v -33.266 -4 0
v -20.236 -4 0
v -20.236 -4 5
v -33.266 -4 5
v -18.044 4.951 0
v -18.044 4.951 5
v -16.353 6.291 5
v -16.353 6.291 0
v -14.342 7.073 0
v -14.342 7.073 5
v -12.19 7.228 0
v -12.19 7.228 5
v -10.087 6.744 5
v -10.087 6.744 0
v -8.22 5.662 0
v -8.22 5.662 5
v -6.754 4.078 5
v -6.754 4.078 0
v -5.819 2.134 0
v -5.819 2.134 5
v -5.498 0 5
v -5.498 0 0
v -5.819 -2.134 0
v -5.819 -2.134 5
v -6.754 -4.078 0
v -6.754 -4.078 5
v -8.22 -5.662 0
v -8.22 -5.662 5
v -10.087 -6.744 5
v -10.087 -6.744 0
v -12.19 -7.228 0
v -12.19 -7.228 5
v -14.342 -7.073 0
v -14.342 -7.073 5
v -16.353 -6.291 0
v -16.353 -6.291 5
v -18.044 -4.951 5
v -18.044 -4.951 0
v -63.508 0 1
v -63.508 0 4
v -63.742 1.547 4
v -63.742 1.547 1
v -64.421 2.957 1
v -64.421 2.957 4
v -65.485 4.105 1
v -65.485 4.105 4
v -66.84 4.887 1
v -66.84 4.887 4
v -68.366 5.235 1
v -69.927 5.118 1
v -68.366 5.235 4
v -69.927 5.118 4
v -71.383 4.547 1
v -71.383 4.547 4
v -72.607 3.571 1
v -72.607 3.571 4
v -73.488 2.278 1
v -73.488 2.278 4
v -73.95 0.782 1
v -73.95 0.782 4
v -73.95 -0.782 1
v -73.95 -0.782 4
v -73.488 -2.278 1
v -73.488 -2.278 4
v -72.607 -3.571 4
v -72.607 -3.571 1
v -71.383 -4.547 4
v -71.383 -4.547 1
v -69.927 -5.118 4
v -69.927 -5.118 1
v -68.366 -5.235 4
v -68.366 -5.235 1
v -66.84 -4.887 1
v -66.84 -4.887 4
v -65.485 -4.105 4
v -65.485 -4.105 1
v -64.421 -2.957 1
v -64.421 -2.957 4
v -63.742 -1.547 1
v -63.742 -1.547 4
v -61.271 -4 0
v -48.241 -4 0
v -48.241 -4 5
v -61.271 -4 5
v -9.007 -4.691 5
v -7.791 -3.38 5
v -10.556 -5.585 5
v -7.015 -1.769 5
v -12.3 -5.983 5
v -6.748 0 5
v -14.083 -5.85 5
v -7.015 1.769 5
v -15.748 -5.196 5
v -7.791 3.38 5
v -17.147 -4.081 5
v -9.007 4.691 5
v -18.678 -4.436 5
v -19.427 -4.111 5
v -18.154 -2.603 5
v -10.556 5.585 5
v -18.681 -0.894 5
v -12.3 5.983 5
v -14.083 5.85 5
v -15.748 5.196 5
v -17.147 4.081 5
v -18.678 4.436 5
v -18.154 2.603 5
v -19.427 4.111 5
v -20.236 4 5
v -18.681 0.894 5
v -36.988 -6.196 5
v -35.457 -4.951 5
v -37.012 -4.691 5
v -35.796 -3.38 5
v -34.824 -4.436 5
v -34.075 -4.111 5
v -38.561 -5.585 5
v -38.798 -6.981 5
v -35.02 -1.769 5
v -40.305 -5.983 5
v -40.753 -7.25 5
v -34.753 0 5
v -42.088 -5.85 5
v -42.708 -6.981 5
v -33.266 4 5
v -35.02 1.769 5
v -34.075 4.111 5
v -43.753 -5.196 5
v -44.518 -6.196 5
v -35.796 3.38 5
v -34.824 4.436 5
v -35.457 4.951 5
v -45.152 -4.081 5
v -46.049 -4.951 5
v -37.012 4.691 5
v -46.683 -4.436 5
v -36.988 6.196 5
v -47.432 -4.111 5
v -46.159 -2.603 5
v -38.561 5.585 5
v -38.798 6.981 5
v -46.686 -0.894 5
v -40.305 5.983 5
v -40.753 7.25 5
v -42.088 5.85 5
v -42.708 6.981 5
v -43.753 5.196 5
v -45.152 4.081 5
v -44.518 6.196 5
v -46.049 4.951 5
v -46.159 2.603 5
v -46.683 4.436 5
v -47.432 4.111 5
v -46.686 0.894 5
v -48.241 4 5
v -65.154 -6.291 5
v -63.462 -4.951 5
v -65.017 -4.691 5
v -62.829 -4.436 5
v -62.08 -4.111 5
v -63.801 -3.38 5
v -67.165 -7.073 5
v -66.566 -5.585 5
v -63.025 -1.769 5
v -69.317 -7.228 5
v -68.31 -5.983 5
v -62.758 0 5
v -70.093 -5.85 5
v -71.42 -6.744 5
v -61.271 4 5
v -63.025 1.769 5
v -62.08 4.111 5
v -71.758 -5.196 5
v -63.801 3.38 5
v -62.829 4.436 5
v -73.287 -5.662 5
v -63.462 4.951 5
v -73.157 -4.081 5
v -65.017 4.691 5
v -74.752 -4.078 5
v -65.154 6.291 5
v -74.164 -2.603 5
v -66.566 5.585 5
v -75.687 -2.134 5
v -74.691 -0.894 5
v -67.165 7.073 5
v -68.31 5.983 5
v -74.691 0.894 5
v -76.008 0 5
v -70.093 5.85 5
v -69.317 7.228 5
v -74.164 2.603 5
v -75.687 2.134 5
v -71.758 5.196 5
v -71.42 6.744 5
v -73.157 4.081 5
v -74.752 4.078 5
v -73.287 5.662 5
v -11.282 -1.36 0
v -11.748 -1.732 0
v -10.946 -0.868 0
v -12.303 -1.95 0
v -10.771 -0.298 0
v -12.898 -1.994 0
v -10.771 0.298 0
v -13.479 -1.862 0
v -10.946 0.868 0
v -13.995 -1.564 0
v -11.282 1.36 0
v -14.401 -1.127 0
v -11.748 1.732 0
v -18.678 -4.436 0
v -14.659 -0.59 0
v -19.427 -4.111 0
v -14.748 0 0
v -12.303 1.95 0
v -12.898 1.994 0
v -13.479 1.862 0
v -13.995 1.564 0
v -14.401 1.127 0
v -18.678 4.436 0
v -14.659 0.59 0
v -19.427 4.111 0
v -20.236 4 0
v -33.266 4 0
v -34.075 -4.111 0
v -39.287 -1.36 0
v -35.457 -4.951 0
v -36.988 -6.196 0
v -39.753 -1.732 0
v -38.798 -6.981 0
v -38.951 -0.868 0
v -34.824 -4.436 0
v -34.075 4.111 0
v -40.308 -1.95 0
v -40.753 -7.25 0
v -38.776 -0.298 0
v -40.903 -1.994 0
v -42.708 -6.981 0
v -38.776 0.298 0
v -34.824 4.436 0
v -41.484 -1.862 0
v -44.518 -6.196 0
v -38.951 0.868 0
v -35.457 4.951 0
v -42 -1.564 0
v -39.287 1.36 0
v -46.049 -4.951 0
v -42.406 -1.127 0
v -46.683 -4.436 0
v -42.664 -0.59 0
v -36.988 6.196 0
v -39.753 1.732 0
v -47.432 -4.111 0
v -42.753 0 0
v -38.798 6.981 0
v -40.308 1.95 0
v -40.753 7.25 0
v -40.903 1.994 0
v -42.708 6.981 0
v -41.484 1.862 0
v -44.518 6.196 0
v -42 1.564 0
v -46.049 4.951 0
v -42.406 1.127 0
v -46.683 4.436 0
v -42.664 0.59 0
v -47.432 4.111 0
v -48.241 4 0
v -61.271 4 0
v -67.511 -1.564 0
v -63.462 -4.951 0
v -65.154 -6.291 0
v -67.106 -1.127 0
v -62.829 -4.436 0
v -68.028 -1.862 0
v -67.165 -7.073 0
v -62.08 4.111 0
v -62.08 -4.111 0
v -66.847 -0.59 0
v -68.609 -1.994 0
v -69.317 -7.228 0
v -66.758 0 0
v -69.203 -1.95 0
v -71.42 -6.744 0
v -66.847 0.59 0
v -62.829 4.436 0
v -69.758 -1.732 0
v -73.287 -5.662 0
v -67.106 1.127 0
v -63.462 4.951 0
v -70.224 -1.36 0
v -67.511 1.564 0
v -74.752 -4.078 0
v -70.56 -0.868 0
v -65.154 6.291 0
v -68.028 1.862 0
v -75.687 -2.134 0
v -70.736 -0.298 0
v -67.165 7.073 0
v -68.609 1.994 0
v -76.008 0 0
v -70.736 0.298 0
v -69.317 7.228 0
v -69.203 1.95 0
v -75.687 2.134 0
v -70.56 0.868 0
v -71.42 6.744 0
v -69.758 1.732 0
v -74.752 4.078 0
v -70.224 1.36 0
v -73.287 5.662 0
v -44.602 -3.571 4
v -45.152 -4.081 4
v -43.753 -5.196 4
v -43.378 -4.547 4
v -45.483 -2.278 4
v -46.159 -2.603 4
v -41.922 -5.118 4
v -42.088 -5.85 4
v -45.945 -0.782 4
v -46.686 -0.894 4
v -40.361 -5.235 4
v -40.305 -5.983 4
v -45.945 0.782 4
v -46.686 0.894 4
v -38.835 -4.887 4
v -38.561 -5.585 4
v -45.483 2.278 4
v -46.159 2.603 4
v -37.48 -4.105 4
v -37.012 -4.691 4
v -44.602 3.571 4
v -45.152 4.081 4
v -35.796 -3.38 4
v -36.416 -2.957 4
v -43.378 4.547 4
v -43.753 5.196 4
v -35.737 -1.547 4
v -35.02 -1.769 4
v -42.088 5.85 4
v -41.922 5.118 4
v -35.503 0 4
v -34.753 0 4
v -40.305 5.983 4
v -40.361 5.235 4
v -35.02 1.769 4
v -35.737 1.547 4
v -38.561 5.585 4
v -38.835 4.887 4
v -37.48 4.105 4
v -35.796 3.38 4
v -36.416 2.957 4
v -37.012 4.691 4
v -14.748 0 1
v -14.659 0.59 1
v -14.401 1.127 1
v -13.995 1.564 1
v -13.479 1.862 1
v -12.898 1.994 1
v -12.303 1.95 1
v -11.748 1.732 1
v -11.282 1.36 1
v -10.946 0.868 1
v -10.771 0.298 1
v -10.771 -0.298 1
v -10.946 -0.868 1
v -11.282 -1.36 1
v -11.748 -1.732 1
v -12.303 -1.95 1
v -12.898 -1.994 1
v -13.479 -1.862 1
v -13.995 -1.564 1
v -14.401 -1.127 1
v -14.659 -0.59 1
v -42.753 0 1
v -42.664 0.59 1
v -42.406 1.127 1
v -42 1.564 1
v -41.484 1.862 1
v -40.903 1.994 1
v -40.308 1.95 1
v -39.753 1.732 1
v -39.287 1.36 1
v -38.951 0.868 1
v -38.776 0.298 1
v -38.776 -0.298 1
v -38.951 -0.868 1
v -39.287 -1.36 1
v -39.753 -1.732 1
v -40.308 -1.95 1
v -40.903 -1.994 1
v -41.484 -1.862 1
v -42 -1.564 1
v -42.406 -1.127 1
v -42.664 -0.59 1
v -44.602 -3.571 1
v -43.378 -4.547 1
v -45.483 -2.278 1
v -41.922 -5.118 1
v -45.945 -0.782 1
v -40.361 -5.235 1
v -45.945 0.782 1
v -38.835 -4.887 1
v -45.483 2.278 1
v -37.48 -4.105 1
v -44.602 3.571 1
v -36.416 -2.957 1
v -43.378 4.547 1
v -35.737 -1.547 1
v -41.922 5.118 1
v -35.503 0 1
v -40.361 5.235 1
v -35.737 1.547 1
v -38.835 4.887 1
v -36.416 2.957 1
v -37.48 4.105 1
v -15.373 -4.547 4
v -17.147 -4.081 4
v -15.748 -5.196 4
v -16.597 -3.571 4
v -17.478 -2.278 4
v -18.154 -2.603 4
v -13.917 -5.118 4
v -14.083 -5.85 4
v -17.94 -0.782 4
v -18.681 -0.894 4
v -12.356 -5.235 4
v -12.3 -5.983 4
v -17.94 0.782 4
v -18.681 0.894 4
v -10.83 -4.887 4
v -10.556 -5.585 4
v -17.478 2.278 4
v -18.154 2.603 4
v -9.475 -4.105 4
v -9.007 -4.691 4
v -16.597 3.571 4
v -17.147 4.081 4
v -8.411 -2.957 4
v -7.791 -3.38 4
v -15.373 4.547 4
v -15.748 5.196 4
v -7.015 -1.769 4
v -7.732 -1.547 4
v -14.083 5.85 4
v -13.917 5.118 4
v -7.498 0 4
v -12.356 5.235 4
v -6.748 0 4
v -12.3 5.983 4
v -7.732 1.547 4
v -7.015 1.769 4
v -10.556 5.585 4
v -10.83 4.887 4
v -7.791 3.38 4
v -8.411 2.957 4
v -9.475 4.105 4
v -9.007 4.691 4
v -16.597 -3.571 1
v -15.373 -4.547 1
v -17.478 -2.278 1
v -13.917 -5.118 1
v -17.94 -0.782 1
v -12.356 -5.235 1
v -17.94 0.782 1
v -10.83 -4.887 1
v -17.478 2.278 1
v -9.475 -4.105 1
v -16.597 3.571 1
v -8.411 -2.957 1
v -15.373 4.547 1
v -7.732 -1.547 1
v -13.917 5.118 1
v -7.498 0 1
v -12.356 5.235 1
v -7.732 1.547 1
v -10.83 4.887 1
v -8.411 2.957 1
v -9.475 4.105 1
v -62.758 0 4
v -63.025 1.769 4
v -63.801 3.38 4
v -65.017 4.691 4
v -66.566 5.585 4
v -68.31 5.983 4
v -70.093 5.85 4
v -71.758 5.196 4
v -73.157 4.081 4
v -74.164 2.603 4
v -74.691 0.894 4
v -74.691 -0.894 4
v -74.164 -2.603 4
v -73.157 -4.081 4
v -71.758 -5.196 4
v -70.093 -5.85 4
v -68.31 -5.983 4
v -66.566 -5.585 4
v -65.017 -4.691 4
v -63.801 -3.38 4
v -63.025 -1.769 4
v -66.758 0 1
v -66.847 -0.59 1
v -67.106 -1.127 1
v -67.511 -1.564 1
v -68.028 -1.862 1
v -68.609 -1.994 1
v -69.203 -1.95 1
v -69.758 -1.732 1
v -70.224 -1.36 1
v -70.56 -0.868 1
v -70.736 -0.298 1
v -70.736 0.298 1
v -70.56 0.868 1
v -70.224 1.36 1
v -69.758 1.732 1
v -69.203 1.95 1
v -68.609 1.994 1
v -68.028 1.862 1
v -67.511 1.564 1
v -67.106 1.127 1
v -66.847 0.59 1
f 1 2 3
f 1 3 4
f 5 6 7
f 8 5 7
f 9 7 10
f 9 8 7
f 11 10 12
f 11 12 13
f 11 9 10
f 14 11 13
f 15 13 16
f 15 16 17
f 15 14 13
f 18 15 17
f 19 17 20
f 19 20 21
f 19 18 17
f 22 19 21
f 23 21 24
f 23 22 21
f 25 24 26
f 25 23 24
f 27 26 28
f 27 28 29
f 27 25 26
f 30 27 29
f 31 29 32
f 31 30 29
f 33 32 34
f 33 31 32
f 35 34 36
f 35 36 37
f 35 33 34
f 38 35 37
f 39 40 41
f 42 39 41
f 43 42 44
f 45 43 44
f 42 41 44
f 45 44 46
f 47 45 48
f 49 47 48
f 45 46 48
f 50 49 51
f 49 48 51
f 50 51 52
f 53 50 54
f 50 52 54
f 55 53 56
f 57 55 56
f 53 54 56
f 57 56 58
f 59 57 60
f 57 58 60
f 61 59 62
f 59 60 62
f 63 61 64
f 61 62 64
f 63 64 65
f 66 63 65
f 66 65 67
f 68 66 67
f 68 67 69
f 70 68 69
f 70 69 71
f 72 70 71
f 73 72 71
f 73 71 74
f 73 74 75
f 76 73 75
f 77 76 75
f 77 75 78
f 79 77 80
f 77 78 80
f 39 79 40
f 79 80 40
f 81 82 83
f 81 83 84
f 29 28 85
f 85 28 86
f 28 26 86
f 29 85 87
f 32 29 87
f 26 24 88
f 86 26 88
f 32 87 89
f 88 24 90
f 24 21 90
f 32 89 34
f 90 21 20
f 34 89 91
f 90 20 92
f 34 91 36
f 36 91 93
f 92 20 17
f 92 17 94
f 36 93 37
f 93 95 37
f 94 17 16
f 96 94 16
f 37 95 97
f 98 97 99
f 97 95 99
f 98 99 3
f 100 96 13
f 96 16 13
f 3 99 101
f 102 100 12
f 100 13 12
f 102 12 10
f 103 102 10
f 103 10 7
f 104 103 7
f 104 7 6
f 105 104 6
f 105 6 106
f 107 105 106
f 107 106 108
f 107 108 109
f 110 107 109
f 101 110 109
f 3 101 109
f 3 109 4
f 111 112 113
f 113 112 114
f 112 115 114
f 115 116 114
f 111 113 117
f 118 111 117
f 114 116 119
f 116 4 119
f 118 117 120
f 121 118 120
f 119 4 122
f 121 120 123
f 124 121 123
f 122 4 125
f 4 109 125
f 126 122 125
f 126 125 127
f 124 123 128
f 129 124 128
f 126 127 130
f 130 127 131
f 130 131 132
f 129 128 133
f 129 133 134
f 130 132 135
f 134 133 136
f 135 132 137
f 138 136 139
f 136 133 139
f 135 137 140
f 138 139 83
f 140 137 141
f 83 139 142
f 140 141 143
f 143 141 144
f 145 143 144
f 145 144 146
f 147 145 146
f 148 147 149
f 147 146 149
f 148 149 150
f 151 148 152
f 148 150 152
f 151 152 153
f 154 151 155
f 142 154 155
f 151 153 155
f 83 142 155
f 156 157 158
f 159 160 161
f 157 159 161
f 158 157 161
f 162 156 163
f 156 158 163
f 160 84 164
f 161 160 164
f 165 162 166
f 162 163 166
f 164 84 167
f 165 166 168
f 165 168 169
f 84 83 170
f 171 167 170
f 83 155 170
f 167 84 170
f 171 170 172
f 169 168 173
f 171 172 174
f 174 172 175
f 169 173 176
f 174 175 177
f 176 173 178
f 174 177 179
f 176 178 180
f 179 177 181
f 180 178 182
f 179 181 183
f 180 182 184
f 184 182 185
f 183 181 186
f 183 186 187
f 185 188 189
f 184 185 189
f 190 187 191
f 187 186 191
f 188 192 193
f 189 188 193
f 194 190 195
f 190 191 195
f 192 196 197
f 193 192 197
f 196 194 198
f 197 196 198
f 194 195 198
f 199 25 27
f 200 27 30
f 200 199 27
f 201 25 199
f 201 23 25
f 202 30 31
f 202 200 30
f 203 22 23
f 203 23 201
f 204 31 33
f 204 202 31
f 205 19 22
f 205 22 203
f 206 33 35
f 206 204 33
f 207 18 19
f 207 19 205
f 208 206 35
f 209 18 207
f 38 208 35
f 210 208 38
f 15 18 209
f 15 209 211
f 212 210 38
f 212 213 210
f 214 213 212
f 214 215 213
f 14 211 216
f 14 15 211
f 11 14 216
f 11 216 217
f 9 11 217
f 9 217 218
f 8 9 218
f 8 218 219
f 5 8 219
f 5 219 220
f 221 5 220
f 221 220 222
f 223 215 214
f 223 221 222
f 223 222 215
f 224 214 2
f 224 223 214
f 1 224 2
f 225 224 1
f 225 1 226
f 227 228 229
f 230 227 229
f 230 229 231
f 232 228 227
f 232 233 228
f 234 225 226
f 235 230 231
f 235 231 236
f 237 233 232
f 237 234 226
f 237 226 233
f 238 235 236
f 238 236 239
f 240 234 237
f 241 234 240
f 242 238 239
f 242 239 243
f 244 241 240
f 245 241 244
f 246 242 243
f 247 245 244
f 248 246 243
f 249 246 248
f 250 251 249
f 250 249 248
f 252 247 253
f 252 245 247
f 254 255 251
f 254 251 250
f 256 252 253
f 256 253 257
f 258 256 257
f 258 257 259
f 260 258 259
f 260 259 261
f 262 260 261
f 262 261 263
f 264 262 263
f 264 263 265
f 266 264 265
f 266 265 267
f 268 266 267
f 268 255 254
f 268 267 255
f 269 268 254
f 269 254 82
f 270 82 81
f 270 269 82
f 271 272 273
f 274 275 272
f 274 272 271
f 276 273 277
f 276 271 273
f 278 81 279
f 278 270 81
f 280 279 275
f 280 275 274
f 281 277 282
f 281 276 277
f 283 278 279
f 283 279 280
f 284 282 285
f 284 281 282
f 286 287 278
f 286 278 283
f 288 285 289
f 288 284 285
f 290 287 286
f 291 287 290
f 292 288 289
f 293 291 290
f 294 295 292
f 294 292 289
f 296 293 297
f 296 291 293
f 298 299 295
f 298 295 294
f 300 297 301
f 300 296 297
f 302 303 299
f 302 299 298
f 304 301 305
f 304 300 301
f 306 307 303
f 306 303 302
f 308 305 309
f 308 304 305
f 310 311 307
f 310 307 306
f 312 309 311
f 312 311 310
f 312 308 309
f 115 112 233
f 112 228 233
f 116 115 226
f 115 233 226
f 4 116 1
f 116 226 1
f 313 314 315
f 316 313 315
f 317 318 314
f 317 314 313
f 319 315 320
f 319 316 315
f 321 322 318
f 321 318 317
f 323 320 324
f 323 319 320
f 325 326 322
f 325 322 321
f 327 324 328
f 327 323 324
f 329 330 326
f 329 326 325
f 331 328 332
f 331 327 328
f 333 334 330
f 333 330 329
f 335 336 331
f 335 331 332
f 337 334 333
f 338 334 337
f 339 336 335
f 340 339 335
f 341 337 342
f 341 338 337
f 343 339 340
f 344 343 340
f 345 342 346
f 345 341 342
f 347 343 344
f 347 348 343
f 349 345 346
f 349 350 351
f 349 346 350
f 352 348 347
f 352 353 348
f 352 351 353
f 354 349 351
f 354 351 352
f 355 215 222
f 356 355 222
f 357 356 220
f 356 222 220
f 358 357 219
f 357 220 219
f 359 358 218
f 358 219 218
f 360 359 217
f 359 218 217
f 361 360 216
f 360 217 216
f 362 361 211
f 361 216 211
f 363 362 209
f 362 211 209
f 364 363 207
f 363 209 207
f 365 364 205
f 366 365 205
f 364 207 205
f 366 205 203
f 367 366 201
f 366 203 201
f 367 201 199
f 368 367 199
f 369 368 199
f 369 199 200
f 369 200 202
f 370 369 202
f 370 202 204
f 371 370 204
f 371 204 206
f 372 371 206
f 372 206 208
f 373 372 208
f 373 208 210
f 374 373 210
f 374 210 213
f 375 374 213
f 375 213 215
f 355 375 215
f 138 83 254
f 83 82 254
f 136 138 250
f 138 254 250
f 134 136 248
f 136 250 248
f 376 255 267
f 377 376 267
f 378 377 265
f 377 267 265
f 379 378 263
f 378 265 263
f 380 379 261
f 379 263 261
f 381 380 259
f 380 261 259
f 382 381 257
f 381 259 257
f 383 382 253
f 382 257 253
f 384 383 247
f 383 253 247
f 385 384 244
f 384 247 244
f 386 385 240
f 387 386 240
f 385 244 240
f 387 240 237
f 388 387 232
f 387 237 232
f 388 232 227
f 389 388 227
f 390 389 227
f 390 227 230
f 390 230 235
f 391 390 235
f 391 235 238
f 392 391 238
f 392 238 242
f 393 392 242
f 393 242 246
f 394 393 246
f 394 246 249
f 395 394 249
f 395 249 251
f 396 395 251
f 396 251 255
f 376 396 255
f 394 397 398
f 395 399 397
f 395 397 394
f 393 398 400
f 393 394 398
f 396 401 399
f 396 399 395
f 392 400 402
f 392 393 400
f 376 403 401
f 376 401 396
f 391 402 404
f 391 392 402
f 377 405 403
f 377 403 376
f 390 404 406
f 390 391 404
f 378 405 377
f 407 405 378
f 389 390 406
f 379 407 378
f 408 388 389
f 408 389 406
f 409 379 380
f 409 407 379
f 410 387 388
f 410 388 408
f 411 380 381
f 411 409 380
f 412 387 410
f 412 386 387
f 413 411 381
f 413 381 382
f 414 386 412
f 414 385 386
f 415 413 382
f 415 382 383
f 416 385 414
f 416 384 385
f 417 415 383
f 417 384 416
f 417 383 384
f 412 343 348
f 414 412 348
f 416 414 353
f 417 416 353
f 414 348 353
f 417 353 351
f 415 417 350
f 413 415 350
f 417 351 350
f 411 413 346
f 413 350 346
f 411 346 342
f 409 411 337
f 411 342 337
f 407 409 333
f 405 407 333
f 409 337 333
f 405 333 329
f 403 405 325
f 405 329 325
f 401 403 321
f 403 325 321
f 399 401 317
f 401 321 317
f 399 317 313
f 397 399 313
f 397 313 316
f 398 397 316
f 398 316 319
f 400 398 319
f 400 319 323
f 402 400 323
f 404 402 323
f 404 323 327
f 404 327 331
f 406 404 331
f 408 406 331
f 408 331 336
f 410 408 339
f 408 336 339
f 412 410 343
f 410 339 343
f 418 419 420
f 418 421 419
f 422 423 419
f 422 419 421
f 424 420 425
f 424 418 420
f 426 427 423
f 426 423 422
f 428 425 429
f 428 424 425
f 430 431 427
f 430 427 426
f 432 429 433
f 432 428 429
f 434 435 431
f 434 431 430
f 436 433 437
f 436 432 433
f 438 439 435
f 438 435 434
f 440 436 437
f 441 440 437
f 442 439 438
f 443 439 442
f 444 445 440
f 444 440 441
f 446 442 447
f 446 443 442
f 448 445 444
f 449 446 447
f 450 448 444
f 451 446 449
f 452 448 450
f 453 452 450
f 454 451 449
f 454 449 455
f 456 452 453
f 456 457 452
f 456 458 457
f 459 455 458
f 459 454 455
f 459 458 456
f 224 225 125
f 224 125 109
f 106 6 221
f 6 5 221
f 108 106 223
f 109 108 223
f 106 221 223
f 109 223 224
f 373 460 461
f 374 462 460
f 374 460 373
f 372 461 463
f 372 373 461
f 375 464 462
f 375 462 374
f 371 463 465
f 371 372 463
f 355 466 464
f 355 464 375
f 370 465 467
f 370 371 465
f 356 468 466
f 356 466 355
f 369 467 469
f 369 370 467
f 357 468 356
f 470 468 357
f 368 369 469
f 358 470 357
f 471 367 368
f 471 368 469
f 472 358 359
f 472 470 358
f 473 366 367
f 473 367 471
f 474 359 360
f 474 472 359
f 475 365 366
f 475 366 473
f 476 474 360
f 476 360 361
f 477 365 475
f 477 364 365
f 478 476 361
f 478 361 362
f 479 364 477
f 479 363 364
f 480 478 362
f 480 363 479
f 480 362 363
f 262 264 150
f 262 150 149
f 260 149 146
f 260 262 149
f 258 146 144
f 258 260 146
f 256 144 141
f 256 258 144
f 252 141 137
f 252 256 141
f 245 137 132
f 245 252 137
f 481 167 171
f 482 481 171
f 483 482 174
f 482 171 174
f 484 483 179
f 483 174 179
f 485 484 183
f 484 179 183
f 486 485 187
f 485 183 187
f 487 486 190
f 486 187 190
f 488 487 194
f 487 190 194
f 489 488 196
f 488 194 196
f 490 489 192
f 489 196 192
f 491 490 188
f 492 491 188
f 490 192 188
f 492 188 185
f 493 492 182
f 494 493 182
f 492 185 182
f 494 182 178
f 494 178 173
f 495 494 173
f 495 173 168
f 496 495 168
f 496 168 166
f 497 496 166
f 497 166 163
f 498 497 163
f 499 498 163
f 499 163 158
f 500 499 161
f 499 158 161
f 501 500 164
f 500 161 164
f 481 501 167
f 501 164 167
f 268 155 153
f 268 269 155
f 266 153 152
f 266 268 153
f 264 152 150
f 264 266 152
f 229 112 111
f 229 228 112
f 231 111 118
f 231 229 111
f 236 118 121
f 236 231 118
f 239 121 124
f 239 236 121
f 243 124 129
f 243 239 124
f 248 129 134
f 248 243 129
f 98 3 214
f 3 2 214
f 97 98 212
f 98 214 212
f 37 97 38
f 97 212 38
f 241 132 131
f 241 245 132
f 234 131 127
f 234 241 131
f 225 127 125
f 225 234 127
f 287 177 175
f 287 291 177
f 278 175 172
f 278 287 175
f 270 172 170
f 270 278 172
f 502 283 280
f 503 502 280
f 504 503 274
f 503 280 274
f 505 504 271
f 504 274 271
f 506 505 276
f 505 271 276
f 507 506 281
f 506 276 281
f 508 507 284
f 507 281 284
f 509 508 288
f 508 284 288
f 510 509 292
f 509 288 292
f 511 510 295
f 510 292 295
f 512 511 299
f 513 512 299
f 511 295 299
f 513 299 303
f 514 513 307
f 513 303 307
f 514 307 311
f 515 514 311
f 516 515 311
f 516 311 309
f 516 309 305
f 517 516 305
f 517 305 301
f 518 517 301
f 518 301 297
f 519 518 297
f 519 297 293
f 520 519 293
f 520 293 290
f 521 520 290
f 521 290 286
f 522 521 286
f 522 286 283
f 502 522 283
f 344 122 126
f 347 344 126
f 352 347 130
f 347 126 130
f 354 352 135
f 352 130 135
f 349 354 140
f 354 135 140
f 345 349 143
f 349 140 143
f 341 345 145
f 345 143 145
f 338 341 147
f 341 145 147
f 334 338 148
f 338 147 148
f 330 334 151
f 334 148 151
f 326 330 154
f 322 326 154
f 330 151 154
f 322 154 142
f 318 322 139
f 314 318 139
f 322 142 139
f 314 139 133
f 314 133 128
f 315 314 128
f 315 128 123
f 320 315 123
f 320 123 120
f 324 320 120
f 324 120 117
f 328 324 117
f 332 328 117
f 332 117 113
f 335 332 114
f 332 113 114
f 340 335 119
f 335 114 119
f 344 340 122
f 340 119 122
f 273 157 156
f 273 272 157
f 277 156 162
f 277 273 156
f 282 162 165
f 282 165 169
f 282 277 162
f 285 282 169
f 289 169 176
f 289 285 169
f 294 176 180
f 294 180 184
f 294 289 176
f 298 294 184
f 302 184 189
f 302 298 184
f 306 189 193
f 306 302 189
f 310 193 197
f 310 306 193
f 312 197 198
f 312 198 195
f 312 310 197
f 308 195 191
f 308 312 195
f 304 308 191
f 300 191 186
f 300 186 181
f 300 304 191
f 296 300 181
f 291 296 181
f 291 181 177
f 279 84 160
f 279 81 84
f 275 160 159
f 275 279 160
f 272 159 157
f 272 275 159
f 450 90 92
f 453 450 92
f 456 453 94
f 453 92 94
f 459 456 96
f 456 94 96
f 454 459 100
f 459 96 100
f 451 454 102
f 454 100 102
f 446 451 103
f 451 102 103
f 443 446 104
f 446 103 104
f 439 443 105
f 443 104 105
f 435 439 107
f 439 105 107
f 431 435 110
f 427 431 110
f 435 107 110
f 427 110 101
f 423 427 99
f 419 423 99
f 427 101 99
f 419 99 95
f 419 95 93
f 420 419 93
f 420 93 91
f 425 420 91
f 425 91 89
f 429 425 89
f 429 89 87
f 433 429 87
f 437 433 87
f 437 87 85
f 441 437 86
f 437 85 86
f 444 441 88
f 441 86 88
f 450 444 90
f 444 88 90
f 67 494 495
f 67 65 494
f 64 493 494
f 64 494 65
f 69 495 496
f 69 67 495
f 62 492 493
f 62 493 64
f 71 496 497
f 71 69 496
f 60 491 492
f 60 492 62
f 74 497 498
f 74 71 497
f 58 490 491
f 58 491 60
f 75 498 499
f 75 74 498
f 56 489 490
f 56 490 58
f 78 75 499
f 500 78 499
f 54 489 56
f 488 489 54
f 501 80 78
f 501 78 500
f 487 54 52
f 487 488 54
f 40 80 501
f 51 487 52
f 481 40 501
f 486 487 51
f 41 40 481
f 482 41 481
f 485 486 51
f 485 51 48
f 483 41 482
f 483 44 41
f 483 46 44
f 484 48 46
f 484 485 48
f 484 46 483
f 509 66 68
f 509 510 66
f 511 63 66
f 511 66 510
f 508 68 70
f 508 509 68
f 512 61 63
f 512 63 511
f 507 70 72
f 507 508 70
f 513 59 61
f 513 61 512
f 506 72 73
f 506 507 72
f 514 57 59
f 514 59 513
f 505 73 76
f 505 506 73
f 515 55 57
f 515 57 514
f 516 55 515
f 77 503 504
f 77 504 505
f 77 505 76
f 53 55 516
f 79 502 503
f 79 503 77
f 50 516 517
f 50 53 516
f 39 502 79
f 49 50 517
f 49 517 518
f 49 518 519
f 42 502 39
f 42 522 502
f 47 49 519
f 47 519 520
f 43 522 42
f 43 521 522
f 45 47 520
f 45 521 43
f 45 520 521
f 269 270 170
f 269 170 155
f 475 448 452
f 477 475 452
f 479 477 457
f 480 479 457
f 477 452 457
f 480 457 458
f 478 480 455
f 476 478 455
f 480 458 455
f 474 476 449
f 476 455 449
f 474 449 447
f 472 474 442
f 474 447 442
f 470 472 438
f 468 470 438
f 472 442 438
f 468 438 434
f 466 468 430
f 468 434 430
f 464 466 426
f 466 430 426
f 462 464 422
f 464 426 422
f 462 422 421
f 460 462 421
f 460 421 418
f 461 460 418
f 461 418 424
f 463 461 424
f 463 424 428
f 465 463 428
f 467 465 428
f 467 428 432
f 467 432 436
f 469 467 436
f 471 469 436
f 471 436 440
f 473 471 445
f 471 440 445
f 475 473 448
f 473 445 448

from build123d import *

# Parameters (mm, degrees)
BOSS_EXTRUDE1_DEPTH = 5
SKETCH2_R           = 7.25
BOSS_EXTRUDE2_DEPTH = 5
SKETCH5_R           = 6
CUT_EXTRUDE2_DEPTH  = 1
SKETCH6_R           = 2
CUT_EXTRUDE3_DEPTH  = 4
FILLET1_R           = 3
SKETCH7_R           = 5.25
CUT_EXTRUDE4_DEPTH  = 3


with BuildPart() as part:
    # Sketch1 → Boss-Extrude1 (new body)
    with BuildSketch(Plane.XY):
        with BuildLine():
            Line((-68.758315939, 4), (-12.748315939, 4))
            ThreePointArc((-12.748315939, 4), (-8.748315939, 0), (-12.748315939, -4))
            Line((-12.748315939, -4), (-68.758315939, -4))
            ThreePointArc((-68.758315939, -4), (-72.758315939, 0), (-68.758315939, 4))
        make_face()
    extrude(amount=BOSS_EXTRUDE1_DEPTH)

    # Sketch2 → Boss-Extrude2 (add)
    with BuildSketch(Plane(origin=(0, 0, 0), x_dir=(-1, 0, 0), z_dir=(0, 0, -1))):
        with Locations((40.753315939, 0)):
            Circle(SKETCH2_R)
        with Locations((68.758315939, 0)):
            Circle(SKETCH2_R)
        with Locations((12.748315939, 0)):
            Circle(SKETCH2_R)
    extrude(amount=-BOSS_EXTRUDE2_DEPTH)

    # Sketch5 → Cut-Extrude2 (cut)
    with BuildSketch(Plane.XY.offset(5)):
        with Locations((-68.758315939, 0)):
            Circle(SKETCH5_R)
        with Locations((-40.753315939, 0)):
            Circle(SKETCH5_R)
        with Locations((-12.748315939, 0)):
            Circle(SKETCH5_R)
    extrude(amount=-CUT_EXTRUDE2_DEPTH, mode=Mode.SUBTRACT)

    # Sketch6 → Cut-Extrude3 (cut)
    with BuildSketch(Plane(origin=(0, 0, 0), x_dir=(-1, 0, 0), z_dir=(0, 0, -1))):
        with Locations((12.748315939, 0)):
            Circle(SKETCH6_R)
        with Locations((40.753315939, 0)):
            Circle(SKETCH6_R)
        with Locations(Location((68.758315939, 0, 0), (0, 0, 180))):
            Circle(SKETCH6_R)
    extrude(amount=-CUT_EXTRUDE3_DEPTH, mode=Mode.SUBTRACT)

    # Fillet1
    fillet1_edges = [part.edges().sort_by_distance(p)[0] for p in [
        (-34.706622628, -4, 2.5),
        (-34.706622628, 4, 2.5),
        (-46.80000925, -4, 2.5),
        (-46.80000925, 4, 2.5),
        (-62.711622628, 4, 2.5),
        (-62.711622628, -4, 2.5),
        (-18.79500925, -4, 2.5),
        (-18.79500925, 4, 2.5),
    ]]
    fillet(fillet1_edges, radius=FILLET1_R)

    # Sketch7 → Cut-Extrude4 (cut)
    with BuildSketch(Plane.XY.offset(4)):
        with Locations((-68.758315939, 0)):
            Circle(SKETCH7_R)
        with Locations((-40.753315939, 0)):
            Circle(SKETCH7_R)
        with Locations((-12.748315939, 0)):
            Circle(SKETCH7_R)
    extrude(amount=-CUT_EXTRUDE4_DEPTH, mode=Mode.SUBTRACT)


solid = part.part
